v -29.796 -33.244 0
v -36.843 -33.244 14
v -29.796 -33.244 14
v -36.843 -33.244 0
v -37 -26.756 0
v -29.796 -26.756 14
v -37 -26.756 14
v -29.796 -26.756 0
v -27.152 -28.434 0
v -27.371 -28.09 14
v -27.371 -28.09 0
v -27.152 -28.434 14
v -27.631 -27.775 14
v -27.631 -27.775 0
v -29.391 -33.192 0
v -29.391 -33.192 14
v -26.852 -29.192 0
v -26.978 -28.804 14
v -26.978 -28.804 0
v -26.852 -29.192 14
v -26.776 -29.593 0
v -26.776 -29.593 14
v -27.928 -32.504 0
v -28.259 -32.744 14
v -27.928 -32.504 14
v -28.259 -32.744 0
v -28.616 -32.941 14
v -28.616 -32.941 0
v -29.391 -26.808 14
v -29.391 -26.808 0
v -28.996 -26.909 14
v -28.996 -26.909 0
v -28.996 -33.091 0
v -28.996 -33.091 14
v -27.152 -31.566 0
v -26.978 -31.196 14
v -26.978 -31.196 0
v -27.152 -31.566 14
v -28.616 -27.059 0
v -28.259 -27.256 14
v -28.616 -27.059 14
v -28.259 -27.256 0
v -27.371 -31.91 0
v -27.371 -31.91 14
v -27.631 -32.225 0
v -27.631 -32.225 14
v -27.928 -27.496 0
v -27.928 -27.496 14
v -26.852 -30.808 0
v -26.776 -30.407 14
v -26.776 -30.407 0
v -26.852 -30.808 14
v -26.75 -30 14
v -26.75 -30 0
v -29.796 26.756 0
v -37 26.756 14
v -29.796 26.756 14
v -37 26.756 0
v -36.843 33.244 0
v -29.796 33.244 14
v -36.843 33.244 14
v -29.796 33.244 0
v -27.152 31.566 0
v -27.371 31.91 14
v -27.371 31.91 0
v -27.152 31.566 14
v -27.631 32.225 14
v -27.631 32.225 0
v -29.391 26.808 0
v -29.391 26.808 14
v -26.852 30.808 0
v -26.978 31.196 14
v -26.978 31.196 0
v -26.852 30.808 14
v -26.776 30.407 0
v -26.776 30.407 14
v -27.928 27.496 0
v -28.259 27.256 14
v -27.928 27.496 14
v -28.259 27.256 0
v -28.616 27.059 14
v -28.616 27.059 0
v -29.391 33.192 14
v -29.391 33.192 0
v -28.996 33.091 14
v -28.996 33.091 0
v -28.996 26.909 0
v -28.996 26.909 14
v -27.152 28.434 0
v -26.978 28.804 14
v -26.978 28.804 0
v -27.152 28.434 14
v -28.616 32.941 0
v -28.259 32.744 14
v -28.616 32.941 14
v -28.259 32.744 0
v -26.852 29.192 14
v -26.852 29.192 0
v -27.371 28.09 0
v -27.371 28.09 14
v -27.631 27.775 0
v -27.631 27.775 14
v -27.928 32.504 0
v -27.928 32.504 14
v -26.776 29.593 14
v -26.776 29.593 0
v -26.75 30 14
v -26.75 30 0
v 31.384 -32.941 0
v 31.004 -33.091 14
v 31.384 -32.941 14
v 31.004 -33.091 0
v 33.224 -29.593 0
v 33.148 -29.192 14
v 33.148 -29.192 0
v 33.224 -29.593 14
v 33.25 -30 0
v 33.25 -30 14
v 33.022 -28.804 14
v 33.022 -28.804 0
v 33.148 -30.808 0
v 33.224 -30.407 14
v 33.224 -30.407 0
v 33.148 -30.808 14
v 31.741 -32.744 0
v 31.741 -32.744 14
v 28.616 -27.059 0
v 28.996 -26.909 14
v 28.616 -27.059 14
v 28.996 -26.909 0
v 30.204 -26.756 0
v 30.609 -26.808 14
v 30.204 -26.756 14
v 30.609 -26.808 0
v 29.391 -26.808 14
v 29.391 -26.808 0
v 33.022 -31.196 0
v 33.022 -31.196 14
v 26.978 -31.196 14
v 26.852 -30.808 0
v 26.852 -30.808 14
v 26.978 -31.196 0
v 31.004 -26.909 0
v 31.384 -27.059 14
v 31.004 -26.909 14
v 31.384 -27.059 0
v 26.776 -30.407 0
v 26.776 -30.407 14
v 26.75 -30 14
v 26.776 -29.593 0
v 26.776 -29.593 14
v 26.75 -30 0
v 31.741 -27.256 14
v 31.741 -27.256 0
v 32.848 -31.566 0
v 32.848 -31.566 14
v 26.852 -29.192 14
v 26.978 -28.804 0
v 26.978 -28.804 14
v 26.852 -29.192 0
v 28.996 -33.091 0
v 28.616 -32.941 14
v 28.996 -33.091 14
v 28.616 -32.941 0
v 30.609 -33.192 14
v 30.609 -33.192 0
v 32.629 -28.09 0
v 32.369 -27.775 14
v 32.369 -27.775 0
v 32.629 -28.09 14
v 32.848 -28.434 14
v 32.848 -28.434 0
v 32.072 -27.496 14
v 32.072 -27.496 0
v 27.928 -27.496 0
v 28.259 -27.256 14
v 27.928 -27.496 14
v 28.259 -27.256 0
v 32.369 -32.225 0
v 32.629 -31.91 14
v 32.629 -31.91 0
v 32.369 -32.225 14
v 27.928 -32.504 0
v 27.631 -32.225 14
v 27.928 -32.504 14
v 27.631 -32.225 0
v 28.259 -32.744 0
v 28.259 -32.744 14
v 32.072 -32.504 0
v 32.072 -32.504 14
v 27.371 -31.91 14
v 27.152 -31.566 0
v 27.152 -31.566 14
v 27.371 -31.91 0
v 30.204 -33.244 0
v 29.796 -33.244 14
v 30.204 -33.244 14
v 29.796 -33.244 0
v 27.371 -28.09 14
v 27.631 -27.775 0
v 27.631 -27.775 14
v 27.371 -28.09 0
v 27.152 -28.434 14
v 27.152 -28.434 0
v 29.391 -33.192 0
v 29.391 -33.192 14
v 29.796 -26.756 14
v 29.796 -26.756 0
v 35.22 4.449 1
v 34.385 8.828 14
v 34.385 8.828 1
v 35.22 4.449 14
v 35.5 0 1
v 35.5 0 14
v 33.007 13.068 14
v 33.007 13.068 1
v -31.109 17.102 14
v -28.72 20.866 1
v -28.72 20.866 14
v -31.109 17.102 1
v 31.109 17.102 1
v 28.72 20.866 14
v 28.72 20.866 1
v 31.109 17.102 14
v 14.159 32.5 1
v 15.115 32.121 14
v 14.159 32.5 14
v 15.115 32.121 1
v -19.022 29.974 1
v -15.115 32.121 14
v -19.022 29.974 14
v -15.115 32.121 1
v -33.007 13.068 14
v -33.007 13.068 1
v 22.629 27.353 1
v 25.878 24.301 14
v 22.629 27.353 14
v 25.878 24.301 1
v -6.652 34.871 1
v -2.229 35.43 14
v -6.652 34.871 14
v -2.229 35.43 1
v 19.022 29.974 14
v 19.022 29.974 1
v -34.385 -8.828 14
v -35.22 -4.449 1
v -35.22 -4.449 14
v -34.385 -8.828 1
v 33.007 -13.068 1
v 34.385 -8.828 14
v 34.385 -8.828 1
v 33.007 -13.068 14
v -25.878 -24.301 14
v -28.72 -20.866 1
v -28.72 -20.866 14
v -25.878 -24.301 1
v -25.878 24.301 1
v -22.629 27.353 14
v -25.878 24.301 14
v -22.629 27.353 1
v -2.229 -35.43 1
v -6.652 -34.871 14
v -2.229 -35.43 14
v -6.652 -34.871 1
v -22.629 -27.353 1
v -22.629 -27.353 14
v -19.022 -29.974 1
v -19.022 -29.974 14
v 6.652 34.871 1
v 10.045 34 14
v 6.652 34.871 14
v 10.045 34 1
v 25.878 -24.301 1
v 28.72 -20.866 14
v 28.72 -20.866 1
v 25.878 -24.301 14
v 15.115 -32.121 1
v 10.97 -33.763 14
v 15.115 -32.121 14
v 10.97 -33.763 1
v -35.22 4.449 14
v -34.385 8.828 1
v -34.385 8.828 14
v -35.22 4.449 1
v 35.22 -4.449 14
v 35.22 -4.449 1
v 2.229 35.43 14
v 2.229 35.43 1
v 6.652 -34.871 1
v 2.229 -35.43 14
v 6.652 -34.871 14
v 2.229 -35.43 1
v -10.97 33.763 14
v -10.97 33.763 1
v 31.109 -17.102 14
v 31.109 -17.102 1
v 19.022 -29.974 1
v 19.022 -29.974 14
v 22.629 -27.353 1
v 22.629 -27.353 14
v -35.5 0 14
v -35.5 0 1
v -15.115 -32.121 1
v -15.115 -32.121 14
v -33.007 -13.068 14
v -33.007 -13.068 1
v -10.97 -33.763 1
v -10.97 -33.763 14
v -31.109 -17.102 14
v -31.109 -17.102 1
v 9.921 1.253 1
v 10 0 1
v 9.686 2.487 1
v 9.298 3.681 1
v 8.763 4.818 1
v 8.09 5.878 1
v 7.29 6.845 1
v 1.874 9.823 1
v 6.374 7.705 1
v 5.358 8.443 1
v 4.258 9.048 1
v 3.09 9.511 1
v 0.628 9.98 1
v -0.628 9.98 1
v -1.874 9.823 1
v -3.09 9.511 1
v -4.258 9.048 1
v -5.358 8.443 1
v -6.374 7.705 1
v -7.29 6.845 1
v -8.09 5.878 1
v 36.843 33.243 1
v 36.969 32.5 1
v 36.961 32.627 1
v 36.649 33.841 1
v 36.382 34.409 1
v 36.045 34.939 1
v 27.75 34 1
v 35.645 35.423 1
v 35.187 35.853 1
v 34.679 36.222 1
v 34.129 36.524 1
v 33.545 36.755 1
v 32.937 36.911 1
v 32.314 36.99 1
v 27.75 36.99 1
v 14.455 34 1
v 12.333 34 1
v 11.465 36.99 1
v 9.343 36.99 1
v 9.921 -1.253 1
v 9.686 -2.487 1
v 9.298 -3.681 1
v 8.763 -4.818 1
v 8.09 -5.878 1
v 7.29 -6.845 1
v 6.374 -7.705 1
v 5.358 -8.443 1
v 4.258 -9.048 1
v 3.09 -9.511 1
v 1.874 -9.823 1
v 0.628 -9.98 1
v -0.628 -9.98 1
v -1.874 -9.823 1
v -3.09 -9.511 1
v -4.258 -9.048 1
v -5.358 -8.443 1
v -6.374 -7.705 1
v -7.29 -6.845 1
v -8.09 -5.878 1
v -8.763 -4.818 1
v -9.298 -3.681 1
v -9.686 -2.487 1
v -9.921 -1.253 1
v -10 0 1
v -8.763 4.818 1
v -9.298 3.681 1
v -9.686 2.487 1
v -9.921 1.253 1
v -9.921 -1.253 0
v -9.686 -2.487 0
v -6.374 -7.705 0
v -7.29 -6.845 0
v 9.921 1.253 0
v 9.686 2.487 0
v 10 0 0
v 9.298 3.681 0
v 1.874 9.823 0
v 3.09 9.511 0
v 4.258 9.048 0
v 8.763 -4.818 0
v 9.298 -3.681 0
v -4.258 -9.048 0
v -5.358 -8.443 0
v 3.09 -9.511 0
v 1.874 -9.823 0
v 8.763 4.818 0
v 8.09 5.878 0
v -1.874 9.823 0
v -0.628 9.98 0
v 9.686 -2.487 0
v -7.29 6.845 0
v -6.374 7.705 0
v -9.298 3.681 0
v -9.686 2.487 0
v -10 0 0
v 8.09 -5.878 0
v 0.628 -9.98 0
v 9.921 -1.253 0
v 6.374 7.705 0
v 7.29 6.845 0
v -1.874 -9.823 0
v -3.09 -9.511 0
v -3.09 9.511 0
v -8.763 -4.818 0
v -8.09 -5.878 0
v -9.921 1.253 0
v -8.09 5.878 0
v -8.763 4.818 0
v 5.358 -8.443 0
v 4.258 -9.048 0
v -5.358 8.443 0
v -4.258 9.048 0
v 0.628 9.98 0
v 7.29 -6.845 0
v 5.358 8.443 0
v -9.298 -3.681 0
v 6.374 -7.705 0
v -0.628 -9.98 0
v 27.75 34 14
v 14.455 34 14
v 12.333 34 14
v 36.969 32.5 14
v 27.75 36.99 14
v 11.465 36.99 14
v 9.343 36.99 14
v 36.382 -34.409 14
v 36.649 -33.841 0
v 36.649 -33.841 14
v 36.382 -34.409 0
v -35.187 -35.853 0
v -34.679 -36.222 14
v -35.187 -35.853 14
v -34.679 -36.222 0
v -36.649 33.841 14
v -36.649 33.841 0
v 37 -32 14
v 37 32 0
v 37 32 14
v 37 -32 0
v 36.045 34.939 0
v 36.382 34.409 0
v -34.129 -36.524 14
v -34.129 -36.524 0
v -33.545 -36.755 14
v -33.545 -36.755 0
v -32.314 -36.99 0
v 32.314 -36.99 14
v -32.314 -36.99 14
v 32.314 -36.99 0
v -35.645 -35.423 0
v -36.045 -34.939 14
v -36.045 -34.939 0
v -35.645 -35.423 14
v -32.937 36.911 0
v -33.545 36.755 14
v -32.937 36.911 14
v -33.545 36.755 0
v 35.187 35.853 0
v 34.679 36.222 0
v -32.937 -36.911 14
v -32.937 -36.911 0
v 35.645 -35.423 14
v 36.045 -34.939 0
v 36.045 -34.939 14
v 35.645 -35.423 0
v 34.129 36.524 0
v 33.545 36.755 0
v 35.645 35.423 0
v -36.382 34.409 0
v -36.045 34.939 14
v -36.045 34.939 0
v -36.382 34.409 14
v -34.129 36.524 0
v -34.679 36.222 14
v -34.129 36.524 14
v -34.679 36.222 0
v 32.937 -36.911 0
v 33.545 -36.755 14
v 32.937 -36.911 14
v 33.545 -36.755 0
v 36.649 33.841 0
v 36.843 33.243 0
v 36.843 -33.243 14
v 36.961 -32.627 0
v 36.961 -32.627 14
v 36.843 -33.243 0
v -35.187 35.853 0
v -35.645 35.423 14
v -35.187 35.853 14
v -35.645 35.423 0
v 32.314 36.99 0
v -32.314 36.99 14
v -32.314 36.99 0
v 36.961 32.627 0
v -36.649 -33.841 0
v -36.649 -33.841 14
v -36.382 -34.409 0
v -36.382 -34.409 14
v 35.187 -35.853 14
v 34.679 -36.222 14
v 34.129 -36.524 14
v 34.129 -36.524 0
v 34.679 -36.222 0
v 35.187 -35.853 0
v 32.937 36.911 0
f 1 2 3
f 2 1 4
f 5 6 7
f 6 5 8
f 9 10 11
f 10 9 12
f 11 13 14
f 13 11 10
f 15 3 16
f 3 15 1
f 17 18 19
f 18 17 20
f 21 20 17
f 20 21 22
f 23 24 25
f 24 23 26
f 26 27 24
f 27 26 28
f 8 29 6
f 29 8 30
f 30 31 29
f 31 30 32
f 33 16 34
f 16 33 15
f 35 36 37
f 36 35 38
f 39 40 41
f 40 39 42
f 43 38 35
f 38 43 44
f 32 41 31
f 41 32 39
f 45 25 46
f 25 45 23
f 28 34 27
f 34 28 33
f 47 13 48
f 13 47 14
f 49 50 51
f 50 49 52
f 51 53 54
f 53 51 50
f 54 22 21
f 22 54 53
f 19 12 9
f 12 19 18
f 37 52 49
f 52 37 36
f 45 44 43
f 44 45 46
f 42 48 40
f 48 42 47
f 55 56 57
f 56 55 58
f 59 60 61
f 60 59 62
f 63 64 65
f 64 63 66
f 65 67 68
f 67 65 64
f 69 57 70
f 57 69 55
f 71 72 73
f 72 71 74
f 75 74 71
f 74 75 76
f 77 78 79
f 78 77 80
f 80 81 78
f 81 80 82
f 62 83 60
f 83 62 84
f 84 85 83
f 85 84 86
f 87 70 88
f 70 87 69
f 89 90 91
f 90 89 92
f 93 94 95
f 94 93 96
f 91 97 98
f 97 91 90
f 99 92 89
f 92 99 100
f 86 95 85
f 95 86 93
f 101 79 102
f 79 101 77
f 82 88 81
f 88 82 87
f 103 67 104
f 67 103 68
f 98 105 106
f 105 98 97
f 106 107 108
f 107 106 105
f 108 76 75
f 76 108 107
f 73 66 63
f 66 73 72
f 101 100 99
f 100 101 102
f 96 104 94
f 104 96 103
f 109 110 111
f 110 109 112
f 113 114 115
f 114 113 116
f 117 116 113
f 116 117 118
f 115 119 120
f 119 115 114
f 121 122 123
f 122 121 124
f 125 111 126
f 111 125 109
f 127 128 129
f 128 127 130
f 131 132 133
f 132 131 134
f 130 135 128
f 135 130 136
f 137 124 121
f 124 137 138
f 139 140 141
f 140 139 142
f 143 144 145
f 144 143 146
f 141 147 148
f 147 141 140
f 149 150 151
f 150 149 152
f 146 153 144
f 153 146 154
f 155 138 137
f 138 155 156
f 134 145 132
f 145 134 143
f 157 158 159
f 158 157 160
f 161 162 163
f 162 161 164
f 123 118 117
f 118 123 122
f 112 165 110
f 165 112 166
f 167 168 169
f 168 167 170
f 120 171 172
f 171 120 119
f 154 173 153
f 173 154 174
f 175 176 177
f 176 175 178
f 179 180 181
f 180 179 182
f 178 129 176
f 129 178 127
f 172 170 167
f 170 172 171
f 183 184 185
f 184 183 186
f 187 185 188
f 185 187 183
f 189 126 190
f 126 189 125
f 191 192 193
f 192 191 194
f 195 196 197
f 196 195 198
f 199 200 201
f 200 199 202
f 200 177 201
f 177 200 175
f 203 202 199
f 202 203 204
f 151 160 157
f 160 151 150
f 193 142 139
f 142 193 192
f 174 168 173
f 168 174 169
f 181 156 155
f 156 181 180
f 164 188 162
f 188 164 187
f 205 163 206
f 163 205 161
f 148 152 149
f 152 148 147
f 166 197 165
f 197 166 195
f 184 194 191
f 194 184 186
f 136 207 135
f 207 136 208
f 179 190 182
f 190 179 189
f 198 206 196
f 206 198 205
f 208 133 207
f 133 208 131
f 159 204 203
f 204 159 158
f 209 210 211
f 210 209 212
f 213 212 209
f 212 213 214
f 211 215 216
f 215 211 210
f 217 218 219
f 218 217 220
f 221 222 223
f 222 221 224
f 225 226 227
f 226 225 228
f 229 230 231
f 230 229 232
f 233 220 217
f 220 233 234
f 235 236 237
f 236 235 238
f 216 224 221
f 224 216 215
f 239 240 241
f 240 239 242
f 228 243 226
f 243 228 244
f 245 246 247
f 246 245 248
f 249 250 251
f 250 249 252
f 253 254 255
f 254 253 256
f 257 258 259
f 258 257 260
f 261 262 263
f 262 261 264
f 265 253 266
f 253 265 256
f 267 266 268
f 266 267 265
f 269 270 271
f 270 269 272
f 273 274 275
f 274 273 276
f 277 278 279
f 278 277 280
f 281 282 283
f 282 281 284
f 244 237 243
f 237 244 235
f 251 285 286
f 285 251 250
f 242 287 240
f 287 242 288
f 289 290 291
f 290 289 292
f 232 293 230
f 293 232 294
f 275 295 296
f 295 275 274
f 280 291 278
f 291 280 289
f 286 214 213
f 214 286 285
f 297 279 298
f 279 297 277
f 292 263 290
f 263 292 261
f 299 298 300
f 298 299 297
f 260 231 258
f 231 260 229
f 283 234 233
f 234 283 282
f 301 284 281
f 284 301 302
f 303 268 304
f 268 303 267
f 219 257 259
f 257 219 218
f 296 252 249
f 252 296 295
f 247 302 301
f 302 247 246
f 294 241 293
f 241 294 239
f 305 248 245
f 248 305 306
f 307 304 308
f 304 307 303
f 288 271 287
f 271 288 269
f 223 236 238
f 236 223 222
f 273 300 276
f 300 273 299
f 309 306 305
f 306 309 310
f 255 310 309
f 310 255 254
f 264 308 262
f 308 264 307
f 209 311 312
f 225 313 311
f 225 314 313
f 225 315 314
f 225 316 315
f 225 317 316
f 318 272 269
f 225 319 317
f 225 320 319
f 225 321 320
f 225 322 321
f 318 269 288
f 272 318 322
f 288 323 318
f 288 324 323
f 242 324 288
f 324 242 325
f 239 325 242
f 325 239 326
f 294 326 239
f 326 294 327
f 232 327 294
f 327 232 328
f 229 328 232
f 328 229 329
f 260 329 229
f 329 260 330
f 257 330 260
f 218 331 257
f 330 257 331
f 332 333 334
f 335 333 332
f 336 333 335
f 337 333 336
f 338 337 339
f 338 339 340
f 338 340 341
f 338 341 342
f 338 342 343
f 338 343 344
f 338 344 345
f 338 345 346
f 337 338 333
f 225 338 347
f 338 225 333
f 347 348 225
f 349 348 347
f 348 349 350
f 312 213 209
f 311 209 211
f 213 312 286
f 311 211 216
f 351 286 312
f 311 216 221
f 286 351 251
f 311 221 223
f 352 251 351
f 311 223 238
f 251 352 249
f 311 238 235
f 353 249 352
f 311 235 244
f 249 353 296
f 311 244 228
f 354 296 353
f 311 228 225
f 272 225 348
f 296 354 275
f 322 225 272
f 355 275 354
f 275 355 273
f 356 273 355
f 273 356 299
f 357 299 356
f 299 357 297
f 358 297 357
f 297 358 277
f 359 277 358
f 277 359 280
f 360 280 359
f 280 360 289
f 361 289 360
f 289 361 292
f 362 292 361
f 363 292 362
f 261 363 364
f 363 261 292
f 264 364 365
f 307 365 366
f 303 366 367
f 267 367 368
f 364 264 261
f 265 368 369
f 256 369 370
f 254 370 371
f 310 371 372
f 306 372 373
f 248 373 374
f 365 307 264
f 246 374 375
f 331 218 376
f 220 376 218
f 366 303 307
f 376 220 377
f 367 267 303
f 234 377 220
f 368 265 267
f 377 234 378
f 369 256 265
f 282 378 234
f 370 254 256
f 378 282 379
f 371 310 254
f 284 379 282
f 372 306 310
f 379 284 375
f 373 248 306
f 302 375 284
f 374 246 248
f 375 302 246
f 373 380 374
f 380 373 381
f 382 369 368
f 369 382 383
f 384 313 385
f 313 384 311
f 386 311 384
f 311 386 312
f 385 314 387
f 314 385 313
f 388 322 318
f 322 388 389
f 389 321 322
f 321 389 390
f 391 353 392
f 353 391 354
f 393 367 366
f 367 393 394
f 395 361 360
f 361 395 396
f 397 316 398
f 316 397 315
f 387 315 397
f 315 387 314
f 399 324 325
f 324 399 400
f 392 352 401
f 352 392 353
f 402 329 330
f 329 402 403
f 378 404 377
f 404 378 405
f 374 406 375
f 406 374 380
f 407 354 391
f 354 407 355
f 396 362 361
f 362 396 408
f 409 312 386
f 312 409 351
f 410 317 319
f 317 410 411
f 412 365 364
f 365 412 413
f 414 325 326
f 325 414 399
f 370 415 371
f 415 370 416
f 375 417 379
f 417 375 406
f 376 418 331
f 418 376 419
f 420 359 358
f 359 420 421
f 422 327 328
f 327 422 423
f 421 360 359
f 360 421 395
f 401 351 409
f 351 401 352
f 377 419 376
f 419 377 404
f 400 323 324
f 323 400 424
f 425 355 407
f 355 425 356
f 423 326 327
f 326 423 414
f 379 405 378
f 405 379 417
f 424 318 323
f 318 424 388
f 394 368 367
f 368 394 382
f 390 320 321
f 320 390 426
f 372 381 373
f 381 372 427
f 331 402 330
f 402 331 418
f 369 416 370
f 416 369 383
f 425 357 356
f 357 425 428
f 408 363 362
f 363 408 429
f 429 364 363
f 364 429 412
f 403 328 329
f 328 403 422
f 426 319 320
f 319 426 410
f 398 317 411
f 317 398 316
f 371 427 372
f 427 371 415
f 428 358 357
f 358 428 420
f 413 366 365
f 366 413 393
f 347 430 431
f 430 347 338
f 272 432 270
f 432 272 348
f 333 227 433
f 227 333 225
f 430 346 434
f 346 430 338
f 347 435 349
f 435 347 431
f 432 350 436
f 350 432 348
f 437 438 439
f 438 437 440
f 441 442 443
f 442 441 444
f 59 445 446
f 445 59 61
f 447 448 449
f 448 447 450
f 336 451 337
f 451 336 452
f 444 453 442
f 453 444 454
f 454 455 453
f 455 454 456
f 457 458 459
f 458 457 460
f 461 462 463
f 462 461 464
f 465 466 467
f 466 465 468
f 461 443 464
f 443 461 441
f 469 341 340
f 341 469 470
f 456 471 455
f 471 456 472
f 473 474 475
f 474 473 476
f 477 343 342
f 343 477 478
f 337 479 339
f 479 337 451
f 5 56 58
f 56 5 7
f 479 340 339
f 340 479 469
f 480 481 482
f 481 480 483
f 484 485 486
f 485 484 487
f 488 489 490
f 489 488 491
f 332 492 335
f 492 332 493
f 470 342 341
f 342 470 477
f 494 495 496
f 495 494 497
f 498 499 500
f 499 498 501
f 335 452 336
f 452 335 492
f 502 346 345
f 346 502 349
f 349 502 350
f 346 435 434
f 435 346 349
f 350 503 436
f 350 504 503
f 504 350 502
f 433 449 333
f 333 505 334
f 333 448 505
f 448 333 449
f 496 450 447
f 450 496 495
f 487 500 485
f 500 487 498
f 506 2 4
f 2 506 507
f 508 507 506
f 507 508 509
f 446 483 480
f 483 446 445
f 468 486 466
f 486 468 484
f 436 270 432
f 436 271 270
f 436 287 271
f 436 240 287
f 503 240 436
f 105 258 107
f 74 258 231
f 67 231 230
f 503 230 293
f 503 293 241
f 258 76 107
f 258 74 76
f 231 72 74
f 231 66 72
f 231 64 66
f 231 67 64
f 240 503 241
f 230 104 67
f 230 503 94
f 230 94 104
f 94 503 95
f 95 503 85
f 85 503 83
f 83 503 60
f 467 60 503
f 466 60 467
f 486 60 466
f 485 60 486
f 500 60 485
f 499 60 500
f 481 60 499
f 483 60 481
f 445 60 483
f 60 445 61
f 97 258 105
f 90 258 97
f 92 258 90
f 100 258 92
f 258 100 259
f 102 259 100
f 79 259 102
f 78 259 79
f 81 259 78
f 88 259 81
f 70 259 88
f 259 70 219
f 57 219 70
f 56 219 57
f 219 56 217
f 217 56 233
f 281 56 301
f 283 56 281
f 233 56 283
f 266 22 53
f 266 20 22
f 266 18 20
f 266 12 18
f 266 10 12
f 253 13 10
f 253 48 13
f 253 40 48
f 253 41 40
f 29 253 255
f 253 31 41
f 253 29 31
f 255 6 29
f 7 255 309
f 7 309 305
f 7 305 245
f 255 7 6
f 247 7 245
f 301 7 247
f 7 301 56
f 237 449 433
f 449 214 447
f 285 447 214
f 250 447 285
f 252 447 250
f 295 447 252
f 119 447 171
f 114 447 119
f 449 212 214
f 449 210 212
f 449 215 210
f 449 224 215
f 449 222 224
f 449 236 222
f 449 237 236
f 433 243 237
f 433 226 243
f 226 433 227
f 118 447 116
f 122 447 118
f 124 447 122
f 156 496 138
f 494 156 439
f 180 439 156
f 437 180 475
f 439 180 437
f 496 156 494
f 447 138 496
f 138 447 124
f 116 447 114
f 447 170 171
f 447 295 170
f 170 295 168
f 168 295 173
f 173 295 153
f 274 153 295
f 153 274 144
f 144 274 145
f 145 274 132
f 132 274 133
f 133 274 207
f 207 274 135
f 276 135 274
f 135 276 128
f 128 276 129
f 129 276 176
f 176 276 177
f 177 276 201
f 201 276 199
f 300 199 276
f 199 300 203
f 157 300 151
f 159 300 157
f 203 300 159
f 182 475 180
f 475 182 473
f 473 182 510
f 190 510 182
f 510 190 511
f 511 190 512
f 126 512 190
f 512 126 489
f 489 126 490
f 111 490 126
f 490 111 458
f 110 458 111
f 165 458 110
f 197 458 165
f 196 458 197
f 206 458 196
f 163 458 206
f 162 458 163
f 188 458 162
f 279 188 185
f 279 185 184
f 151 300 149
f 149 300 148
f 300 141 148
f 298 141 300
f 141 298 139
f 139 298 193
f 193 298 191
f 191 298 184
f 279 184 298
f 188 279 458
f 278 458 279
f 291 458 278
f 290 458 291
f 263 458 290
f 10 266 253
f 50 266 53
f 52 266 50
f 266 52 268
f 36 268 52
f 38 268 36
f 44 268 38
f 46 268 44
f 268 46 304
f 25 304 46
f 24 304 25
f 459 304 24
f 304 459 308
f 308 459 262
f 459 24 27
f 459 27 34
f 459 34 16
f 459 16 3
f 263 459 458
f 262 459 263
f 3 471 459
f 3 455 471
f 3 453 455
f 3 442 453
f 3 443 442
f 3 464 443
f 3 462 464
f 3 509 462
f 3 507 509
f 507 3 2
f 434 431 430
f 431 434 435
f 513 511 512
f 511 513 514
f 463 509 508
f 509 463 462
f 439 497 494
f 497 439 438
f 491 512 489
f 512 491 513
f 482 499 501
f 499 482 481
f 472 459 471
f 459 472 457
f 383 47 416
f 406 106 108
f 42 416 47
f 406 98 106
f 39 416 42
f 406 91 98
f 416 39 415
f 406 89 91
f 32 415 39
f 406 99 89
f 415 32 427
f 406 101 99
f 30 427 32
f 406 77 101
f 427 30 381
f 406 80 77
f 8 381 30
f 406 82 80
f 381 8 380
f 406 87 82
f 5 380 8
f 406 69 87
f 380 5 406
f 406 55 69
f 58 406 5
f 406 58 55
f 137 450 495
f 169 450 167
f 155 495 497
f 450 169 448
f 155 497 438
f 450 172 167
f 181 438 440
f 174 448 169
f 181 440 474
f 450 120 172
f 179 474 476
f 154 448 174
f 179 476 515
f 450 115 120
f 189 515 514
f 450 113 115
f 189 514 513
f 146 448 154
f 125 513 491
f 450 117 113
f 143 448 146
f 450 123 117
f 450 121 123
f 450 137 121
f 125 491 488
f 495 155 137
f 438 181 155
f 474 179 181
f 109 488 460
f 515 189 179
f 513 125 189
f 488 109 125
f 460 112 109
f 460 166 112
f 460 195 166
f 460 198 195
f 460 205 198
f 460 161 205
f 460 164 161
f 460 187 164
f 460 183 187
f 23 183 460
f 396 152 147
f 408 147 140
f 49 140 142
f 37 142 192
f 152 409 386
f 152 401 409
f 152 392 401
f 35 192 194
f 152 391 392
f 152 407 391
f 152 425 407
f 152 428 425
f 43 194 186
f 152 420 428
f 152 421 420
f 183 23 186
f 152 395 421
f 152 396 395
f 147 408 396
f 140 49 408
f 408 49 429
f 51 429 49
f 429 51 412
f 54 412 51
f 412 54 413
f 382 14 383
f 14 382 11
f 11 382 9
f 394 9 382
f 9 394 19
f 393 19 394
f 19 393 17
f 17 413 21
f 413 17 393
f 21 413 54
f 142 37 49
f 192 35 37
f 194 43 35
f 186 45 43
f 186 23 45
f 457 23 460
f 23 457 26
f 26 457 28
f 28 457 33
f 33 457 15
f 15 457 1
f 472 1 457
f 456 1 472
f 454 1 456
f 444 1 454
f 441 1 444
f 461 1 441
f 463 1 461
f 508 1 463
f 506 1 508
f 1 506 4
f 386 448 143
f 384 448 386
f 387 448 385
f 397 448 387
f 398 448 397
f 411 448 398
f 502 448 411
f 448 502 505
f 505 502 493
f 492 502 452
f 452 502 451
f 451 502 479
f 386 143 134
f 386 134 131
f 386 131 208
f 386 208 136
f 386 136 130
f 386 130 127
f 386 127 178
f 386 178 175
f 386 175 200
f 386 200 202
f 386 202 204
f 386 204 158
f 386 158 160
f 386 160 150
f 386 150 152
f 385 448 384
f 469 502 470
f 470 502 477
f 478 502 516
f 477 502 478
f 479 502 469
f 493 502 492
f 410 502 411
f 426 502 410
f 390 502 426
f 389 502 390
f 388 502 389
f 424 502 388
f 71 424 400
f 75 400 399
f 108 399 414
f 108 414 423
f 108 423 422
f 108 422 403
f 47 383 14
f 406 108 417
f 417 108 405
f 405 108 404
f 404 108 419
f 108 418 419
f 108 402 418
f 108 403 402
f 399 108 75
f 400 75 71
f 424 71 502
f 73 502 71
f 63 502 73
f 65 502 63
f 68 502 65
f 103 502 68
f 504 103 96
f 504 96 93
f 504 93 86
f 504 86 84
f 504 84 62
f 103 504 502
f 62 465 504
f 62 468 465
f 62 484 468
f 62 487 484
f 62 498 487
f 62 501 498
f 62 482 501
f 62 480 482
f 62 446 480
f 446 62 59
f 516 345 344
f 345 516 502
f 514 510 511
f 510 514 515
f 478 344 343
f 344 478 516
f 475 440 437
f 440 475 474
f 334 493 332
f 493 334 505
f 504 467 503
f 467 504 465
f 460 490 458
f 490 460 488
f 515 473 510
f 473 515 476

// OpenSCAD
$fn = 50;


difference() {
	union() {
		translate(v = [0, 0, 0]) {
			rotate(a = [0, 0, 0]) {
				hull() {
					translate(v = [-32.0000000000, 32.0000000000, 0]) {
						rotate(a = [0, 0, 0]) {
							translate(v = [0, 0, 0]) {
								rotate(a = [0, 0, 0]) {
									cylinder(h = 14, r = 5);
								}
							}
						}
					}
					translate(v = [32.0000000000, 32.0000000000, 0]) {
						rotate(a = [0, 0, 0]) {
							translate(v = [0, 0, 0]) {
								rotate(a = [0, 0, 0]) {
									cylinder(h = 14, r = 5);
								}
							}
						}
					}
					translate(v = [-32.0000000000, -32.0000000000, 0]) {
						rotate(a = [0, 0, 0]) {
							translate(v = [0, 0, 0]) {
								rotate(a = [0, 0, 0]) {
									cylinder(h = 14, r = 5);
								}
							}
						}
					}
					translate(v = [32.0000000000, -32.0000000000, 0]) {
						rotate(a = [0, 0, 0]) {
							translate(v = [0, 0, 0]) {
								rotate(a = [0, 0, 0]) {
									cylinder(h = 14, r = 5);
								}
							}
						}
					}
				}
			}
		}
	}
	union() {
		translate(v = [-37.5000000000, -30.0000000000, -125]) {
			rotate(a = [0, 0, 0]) {
				hull() {
					translate(v = [7.5000000000, 0, 0]) {
						rotate(a = [0, 0, 0]) {
							translate(v = [0, 0, 0]) {
								rotate(a = [0, 0, 0]) {
									cylinder(h = 250, r = 3.2500000000);
								}
							}
						}
					}
					translate(v = [-7.5000000000, 0, 0]) {
						rotate(a = [0, 0, 0]) {
							translate(v = [0, 0, 0]) {
								rotate(a = [0, 0, 0]) {
									cylinder(h = 250, r = 3.2500000000);
								}
							}
						}
					}
				}
			}
		}
		translate(v = [-37.5000000000, 30.0000000000, -125]) {
			rotate(a = [0, 0, 0]) {
				hull() {
					translate(v = [7.5000000000, 0, 0]) {
						rotate(a = [0, 0, 0]) {
							translate(v = [0, 0, 0]) {
								rotate(a = [0, 0, 0]) {
									cylinder(h = 250, r = 3.2500000000);
								}
							}
						}
					}
					translate(v = [-7.5000000000, 0, 0]) {
						rotate(a = [0, 0, 0]) {
							translate(v = [0, 0, 0]) {
								rotate(a = [0, 0, 0]) {
									cylinder(h = 250, r = 3.2500000000);
								}
							}
						}
					}
				}
			}
		}
		translate(v = [30.0000000000, -30.0000000000, -125.0000000000]) {
			rotate(a = [0, 0, 0]) {
				cylinder(h = 250, r = 3.2500000000);
			}
		}
		translate(v = [0, 0, 1.0000000000]) {
			rotate(a = [0, 0, 0]) {
				cylinder(h = 16, r = 35.5000000000);
			}
		}
		translate(v = [0, 0, -7.0000000000]) {
			rotate(a = [0, 0, 0]) {
				cylinder(h = 14, r = 10.0000000000);
			}
		}
		translate(v = [0.0000000000, 32.5000000000, 1]) {
			rotate(a = [0, 0, 0]) {
				cube(size = [37.0000000000, 1.5000000000, 16]);
			}
		}
		translate(v = [27.7500000000, 32.5000000000, 1]) {
			rotate(a = [0, 0, 0]) {
				cube(size = [9.2500000000, 4.5000000000, 16]);
			}
		}
		translate(v = [8.5833333333, 37.7500000000, 1]) {
			rotate(a = [0, 0, -45]) {
				cube(size = [7.5000000000, 1.5000000000, 16]);
			}
		}
	}
}
